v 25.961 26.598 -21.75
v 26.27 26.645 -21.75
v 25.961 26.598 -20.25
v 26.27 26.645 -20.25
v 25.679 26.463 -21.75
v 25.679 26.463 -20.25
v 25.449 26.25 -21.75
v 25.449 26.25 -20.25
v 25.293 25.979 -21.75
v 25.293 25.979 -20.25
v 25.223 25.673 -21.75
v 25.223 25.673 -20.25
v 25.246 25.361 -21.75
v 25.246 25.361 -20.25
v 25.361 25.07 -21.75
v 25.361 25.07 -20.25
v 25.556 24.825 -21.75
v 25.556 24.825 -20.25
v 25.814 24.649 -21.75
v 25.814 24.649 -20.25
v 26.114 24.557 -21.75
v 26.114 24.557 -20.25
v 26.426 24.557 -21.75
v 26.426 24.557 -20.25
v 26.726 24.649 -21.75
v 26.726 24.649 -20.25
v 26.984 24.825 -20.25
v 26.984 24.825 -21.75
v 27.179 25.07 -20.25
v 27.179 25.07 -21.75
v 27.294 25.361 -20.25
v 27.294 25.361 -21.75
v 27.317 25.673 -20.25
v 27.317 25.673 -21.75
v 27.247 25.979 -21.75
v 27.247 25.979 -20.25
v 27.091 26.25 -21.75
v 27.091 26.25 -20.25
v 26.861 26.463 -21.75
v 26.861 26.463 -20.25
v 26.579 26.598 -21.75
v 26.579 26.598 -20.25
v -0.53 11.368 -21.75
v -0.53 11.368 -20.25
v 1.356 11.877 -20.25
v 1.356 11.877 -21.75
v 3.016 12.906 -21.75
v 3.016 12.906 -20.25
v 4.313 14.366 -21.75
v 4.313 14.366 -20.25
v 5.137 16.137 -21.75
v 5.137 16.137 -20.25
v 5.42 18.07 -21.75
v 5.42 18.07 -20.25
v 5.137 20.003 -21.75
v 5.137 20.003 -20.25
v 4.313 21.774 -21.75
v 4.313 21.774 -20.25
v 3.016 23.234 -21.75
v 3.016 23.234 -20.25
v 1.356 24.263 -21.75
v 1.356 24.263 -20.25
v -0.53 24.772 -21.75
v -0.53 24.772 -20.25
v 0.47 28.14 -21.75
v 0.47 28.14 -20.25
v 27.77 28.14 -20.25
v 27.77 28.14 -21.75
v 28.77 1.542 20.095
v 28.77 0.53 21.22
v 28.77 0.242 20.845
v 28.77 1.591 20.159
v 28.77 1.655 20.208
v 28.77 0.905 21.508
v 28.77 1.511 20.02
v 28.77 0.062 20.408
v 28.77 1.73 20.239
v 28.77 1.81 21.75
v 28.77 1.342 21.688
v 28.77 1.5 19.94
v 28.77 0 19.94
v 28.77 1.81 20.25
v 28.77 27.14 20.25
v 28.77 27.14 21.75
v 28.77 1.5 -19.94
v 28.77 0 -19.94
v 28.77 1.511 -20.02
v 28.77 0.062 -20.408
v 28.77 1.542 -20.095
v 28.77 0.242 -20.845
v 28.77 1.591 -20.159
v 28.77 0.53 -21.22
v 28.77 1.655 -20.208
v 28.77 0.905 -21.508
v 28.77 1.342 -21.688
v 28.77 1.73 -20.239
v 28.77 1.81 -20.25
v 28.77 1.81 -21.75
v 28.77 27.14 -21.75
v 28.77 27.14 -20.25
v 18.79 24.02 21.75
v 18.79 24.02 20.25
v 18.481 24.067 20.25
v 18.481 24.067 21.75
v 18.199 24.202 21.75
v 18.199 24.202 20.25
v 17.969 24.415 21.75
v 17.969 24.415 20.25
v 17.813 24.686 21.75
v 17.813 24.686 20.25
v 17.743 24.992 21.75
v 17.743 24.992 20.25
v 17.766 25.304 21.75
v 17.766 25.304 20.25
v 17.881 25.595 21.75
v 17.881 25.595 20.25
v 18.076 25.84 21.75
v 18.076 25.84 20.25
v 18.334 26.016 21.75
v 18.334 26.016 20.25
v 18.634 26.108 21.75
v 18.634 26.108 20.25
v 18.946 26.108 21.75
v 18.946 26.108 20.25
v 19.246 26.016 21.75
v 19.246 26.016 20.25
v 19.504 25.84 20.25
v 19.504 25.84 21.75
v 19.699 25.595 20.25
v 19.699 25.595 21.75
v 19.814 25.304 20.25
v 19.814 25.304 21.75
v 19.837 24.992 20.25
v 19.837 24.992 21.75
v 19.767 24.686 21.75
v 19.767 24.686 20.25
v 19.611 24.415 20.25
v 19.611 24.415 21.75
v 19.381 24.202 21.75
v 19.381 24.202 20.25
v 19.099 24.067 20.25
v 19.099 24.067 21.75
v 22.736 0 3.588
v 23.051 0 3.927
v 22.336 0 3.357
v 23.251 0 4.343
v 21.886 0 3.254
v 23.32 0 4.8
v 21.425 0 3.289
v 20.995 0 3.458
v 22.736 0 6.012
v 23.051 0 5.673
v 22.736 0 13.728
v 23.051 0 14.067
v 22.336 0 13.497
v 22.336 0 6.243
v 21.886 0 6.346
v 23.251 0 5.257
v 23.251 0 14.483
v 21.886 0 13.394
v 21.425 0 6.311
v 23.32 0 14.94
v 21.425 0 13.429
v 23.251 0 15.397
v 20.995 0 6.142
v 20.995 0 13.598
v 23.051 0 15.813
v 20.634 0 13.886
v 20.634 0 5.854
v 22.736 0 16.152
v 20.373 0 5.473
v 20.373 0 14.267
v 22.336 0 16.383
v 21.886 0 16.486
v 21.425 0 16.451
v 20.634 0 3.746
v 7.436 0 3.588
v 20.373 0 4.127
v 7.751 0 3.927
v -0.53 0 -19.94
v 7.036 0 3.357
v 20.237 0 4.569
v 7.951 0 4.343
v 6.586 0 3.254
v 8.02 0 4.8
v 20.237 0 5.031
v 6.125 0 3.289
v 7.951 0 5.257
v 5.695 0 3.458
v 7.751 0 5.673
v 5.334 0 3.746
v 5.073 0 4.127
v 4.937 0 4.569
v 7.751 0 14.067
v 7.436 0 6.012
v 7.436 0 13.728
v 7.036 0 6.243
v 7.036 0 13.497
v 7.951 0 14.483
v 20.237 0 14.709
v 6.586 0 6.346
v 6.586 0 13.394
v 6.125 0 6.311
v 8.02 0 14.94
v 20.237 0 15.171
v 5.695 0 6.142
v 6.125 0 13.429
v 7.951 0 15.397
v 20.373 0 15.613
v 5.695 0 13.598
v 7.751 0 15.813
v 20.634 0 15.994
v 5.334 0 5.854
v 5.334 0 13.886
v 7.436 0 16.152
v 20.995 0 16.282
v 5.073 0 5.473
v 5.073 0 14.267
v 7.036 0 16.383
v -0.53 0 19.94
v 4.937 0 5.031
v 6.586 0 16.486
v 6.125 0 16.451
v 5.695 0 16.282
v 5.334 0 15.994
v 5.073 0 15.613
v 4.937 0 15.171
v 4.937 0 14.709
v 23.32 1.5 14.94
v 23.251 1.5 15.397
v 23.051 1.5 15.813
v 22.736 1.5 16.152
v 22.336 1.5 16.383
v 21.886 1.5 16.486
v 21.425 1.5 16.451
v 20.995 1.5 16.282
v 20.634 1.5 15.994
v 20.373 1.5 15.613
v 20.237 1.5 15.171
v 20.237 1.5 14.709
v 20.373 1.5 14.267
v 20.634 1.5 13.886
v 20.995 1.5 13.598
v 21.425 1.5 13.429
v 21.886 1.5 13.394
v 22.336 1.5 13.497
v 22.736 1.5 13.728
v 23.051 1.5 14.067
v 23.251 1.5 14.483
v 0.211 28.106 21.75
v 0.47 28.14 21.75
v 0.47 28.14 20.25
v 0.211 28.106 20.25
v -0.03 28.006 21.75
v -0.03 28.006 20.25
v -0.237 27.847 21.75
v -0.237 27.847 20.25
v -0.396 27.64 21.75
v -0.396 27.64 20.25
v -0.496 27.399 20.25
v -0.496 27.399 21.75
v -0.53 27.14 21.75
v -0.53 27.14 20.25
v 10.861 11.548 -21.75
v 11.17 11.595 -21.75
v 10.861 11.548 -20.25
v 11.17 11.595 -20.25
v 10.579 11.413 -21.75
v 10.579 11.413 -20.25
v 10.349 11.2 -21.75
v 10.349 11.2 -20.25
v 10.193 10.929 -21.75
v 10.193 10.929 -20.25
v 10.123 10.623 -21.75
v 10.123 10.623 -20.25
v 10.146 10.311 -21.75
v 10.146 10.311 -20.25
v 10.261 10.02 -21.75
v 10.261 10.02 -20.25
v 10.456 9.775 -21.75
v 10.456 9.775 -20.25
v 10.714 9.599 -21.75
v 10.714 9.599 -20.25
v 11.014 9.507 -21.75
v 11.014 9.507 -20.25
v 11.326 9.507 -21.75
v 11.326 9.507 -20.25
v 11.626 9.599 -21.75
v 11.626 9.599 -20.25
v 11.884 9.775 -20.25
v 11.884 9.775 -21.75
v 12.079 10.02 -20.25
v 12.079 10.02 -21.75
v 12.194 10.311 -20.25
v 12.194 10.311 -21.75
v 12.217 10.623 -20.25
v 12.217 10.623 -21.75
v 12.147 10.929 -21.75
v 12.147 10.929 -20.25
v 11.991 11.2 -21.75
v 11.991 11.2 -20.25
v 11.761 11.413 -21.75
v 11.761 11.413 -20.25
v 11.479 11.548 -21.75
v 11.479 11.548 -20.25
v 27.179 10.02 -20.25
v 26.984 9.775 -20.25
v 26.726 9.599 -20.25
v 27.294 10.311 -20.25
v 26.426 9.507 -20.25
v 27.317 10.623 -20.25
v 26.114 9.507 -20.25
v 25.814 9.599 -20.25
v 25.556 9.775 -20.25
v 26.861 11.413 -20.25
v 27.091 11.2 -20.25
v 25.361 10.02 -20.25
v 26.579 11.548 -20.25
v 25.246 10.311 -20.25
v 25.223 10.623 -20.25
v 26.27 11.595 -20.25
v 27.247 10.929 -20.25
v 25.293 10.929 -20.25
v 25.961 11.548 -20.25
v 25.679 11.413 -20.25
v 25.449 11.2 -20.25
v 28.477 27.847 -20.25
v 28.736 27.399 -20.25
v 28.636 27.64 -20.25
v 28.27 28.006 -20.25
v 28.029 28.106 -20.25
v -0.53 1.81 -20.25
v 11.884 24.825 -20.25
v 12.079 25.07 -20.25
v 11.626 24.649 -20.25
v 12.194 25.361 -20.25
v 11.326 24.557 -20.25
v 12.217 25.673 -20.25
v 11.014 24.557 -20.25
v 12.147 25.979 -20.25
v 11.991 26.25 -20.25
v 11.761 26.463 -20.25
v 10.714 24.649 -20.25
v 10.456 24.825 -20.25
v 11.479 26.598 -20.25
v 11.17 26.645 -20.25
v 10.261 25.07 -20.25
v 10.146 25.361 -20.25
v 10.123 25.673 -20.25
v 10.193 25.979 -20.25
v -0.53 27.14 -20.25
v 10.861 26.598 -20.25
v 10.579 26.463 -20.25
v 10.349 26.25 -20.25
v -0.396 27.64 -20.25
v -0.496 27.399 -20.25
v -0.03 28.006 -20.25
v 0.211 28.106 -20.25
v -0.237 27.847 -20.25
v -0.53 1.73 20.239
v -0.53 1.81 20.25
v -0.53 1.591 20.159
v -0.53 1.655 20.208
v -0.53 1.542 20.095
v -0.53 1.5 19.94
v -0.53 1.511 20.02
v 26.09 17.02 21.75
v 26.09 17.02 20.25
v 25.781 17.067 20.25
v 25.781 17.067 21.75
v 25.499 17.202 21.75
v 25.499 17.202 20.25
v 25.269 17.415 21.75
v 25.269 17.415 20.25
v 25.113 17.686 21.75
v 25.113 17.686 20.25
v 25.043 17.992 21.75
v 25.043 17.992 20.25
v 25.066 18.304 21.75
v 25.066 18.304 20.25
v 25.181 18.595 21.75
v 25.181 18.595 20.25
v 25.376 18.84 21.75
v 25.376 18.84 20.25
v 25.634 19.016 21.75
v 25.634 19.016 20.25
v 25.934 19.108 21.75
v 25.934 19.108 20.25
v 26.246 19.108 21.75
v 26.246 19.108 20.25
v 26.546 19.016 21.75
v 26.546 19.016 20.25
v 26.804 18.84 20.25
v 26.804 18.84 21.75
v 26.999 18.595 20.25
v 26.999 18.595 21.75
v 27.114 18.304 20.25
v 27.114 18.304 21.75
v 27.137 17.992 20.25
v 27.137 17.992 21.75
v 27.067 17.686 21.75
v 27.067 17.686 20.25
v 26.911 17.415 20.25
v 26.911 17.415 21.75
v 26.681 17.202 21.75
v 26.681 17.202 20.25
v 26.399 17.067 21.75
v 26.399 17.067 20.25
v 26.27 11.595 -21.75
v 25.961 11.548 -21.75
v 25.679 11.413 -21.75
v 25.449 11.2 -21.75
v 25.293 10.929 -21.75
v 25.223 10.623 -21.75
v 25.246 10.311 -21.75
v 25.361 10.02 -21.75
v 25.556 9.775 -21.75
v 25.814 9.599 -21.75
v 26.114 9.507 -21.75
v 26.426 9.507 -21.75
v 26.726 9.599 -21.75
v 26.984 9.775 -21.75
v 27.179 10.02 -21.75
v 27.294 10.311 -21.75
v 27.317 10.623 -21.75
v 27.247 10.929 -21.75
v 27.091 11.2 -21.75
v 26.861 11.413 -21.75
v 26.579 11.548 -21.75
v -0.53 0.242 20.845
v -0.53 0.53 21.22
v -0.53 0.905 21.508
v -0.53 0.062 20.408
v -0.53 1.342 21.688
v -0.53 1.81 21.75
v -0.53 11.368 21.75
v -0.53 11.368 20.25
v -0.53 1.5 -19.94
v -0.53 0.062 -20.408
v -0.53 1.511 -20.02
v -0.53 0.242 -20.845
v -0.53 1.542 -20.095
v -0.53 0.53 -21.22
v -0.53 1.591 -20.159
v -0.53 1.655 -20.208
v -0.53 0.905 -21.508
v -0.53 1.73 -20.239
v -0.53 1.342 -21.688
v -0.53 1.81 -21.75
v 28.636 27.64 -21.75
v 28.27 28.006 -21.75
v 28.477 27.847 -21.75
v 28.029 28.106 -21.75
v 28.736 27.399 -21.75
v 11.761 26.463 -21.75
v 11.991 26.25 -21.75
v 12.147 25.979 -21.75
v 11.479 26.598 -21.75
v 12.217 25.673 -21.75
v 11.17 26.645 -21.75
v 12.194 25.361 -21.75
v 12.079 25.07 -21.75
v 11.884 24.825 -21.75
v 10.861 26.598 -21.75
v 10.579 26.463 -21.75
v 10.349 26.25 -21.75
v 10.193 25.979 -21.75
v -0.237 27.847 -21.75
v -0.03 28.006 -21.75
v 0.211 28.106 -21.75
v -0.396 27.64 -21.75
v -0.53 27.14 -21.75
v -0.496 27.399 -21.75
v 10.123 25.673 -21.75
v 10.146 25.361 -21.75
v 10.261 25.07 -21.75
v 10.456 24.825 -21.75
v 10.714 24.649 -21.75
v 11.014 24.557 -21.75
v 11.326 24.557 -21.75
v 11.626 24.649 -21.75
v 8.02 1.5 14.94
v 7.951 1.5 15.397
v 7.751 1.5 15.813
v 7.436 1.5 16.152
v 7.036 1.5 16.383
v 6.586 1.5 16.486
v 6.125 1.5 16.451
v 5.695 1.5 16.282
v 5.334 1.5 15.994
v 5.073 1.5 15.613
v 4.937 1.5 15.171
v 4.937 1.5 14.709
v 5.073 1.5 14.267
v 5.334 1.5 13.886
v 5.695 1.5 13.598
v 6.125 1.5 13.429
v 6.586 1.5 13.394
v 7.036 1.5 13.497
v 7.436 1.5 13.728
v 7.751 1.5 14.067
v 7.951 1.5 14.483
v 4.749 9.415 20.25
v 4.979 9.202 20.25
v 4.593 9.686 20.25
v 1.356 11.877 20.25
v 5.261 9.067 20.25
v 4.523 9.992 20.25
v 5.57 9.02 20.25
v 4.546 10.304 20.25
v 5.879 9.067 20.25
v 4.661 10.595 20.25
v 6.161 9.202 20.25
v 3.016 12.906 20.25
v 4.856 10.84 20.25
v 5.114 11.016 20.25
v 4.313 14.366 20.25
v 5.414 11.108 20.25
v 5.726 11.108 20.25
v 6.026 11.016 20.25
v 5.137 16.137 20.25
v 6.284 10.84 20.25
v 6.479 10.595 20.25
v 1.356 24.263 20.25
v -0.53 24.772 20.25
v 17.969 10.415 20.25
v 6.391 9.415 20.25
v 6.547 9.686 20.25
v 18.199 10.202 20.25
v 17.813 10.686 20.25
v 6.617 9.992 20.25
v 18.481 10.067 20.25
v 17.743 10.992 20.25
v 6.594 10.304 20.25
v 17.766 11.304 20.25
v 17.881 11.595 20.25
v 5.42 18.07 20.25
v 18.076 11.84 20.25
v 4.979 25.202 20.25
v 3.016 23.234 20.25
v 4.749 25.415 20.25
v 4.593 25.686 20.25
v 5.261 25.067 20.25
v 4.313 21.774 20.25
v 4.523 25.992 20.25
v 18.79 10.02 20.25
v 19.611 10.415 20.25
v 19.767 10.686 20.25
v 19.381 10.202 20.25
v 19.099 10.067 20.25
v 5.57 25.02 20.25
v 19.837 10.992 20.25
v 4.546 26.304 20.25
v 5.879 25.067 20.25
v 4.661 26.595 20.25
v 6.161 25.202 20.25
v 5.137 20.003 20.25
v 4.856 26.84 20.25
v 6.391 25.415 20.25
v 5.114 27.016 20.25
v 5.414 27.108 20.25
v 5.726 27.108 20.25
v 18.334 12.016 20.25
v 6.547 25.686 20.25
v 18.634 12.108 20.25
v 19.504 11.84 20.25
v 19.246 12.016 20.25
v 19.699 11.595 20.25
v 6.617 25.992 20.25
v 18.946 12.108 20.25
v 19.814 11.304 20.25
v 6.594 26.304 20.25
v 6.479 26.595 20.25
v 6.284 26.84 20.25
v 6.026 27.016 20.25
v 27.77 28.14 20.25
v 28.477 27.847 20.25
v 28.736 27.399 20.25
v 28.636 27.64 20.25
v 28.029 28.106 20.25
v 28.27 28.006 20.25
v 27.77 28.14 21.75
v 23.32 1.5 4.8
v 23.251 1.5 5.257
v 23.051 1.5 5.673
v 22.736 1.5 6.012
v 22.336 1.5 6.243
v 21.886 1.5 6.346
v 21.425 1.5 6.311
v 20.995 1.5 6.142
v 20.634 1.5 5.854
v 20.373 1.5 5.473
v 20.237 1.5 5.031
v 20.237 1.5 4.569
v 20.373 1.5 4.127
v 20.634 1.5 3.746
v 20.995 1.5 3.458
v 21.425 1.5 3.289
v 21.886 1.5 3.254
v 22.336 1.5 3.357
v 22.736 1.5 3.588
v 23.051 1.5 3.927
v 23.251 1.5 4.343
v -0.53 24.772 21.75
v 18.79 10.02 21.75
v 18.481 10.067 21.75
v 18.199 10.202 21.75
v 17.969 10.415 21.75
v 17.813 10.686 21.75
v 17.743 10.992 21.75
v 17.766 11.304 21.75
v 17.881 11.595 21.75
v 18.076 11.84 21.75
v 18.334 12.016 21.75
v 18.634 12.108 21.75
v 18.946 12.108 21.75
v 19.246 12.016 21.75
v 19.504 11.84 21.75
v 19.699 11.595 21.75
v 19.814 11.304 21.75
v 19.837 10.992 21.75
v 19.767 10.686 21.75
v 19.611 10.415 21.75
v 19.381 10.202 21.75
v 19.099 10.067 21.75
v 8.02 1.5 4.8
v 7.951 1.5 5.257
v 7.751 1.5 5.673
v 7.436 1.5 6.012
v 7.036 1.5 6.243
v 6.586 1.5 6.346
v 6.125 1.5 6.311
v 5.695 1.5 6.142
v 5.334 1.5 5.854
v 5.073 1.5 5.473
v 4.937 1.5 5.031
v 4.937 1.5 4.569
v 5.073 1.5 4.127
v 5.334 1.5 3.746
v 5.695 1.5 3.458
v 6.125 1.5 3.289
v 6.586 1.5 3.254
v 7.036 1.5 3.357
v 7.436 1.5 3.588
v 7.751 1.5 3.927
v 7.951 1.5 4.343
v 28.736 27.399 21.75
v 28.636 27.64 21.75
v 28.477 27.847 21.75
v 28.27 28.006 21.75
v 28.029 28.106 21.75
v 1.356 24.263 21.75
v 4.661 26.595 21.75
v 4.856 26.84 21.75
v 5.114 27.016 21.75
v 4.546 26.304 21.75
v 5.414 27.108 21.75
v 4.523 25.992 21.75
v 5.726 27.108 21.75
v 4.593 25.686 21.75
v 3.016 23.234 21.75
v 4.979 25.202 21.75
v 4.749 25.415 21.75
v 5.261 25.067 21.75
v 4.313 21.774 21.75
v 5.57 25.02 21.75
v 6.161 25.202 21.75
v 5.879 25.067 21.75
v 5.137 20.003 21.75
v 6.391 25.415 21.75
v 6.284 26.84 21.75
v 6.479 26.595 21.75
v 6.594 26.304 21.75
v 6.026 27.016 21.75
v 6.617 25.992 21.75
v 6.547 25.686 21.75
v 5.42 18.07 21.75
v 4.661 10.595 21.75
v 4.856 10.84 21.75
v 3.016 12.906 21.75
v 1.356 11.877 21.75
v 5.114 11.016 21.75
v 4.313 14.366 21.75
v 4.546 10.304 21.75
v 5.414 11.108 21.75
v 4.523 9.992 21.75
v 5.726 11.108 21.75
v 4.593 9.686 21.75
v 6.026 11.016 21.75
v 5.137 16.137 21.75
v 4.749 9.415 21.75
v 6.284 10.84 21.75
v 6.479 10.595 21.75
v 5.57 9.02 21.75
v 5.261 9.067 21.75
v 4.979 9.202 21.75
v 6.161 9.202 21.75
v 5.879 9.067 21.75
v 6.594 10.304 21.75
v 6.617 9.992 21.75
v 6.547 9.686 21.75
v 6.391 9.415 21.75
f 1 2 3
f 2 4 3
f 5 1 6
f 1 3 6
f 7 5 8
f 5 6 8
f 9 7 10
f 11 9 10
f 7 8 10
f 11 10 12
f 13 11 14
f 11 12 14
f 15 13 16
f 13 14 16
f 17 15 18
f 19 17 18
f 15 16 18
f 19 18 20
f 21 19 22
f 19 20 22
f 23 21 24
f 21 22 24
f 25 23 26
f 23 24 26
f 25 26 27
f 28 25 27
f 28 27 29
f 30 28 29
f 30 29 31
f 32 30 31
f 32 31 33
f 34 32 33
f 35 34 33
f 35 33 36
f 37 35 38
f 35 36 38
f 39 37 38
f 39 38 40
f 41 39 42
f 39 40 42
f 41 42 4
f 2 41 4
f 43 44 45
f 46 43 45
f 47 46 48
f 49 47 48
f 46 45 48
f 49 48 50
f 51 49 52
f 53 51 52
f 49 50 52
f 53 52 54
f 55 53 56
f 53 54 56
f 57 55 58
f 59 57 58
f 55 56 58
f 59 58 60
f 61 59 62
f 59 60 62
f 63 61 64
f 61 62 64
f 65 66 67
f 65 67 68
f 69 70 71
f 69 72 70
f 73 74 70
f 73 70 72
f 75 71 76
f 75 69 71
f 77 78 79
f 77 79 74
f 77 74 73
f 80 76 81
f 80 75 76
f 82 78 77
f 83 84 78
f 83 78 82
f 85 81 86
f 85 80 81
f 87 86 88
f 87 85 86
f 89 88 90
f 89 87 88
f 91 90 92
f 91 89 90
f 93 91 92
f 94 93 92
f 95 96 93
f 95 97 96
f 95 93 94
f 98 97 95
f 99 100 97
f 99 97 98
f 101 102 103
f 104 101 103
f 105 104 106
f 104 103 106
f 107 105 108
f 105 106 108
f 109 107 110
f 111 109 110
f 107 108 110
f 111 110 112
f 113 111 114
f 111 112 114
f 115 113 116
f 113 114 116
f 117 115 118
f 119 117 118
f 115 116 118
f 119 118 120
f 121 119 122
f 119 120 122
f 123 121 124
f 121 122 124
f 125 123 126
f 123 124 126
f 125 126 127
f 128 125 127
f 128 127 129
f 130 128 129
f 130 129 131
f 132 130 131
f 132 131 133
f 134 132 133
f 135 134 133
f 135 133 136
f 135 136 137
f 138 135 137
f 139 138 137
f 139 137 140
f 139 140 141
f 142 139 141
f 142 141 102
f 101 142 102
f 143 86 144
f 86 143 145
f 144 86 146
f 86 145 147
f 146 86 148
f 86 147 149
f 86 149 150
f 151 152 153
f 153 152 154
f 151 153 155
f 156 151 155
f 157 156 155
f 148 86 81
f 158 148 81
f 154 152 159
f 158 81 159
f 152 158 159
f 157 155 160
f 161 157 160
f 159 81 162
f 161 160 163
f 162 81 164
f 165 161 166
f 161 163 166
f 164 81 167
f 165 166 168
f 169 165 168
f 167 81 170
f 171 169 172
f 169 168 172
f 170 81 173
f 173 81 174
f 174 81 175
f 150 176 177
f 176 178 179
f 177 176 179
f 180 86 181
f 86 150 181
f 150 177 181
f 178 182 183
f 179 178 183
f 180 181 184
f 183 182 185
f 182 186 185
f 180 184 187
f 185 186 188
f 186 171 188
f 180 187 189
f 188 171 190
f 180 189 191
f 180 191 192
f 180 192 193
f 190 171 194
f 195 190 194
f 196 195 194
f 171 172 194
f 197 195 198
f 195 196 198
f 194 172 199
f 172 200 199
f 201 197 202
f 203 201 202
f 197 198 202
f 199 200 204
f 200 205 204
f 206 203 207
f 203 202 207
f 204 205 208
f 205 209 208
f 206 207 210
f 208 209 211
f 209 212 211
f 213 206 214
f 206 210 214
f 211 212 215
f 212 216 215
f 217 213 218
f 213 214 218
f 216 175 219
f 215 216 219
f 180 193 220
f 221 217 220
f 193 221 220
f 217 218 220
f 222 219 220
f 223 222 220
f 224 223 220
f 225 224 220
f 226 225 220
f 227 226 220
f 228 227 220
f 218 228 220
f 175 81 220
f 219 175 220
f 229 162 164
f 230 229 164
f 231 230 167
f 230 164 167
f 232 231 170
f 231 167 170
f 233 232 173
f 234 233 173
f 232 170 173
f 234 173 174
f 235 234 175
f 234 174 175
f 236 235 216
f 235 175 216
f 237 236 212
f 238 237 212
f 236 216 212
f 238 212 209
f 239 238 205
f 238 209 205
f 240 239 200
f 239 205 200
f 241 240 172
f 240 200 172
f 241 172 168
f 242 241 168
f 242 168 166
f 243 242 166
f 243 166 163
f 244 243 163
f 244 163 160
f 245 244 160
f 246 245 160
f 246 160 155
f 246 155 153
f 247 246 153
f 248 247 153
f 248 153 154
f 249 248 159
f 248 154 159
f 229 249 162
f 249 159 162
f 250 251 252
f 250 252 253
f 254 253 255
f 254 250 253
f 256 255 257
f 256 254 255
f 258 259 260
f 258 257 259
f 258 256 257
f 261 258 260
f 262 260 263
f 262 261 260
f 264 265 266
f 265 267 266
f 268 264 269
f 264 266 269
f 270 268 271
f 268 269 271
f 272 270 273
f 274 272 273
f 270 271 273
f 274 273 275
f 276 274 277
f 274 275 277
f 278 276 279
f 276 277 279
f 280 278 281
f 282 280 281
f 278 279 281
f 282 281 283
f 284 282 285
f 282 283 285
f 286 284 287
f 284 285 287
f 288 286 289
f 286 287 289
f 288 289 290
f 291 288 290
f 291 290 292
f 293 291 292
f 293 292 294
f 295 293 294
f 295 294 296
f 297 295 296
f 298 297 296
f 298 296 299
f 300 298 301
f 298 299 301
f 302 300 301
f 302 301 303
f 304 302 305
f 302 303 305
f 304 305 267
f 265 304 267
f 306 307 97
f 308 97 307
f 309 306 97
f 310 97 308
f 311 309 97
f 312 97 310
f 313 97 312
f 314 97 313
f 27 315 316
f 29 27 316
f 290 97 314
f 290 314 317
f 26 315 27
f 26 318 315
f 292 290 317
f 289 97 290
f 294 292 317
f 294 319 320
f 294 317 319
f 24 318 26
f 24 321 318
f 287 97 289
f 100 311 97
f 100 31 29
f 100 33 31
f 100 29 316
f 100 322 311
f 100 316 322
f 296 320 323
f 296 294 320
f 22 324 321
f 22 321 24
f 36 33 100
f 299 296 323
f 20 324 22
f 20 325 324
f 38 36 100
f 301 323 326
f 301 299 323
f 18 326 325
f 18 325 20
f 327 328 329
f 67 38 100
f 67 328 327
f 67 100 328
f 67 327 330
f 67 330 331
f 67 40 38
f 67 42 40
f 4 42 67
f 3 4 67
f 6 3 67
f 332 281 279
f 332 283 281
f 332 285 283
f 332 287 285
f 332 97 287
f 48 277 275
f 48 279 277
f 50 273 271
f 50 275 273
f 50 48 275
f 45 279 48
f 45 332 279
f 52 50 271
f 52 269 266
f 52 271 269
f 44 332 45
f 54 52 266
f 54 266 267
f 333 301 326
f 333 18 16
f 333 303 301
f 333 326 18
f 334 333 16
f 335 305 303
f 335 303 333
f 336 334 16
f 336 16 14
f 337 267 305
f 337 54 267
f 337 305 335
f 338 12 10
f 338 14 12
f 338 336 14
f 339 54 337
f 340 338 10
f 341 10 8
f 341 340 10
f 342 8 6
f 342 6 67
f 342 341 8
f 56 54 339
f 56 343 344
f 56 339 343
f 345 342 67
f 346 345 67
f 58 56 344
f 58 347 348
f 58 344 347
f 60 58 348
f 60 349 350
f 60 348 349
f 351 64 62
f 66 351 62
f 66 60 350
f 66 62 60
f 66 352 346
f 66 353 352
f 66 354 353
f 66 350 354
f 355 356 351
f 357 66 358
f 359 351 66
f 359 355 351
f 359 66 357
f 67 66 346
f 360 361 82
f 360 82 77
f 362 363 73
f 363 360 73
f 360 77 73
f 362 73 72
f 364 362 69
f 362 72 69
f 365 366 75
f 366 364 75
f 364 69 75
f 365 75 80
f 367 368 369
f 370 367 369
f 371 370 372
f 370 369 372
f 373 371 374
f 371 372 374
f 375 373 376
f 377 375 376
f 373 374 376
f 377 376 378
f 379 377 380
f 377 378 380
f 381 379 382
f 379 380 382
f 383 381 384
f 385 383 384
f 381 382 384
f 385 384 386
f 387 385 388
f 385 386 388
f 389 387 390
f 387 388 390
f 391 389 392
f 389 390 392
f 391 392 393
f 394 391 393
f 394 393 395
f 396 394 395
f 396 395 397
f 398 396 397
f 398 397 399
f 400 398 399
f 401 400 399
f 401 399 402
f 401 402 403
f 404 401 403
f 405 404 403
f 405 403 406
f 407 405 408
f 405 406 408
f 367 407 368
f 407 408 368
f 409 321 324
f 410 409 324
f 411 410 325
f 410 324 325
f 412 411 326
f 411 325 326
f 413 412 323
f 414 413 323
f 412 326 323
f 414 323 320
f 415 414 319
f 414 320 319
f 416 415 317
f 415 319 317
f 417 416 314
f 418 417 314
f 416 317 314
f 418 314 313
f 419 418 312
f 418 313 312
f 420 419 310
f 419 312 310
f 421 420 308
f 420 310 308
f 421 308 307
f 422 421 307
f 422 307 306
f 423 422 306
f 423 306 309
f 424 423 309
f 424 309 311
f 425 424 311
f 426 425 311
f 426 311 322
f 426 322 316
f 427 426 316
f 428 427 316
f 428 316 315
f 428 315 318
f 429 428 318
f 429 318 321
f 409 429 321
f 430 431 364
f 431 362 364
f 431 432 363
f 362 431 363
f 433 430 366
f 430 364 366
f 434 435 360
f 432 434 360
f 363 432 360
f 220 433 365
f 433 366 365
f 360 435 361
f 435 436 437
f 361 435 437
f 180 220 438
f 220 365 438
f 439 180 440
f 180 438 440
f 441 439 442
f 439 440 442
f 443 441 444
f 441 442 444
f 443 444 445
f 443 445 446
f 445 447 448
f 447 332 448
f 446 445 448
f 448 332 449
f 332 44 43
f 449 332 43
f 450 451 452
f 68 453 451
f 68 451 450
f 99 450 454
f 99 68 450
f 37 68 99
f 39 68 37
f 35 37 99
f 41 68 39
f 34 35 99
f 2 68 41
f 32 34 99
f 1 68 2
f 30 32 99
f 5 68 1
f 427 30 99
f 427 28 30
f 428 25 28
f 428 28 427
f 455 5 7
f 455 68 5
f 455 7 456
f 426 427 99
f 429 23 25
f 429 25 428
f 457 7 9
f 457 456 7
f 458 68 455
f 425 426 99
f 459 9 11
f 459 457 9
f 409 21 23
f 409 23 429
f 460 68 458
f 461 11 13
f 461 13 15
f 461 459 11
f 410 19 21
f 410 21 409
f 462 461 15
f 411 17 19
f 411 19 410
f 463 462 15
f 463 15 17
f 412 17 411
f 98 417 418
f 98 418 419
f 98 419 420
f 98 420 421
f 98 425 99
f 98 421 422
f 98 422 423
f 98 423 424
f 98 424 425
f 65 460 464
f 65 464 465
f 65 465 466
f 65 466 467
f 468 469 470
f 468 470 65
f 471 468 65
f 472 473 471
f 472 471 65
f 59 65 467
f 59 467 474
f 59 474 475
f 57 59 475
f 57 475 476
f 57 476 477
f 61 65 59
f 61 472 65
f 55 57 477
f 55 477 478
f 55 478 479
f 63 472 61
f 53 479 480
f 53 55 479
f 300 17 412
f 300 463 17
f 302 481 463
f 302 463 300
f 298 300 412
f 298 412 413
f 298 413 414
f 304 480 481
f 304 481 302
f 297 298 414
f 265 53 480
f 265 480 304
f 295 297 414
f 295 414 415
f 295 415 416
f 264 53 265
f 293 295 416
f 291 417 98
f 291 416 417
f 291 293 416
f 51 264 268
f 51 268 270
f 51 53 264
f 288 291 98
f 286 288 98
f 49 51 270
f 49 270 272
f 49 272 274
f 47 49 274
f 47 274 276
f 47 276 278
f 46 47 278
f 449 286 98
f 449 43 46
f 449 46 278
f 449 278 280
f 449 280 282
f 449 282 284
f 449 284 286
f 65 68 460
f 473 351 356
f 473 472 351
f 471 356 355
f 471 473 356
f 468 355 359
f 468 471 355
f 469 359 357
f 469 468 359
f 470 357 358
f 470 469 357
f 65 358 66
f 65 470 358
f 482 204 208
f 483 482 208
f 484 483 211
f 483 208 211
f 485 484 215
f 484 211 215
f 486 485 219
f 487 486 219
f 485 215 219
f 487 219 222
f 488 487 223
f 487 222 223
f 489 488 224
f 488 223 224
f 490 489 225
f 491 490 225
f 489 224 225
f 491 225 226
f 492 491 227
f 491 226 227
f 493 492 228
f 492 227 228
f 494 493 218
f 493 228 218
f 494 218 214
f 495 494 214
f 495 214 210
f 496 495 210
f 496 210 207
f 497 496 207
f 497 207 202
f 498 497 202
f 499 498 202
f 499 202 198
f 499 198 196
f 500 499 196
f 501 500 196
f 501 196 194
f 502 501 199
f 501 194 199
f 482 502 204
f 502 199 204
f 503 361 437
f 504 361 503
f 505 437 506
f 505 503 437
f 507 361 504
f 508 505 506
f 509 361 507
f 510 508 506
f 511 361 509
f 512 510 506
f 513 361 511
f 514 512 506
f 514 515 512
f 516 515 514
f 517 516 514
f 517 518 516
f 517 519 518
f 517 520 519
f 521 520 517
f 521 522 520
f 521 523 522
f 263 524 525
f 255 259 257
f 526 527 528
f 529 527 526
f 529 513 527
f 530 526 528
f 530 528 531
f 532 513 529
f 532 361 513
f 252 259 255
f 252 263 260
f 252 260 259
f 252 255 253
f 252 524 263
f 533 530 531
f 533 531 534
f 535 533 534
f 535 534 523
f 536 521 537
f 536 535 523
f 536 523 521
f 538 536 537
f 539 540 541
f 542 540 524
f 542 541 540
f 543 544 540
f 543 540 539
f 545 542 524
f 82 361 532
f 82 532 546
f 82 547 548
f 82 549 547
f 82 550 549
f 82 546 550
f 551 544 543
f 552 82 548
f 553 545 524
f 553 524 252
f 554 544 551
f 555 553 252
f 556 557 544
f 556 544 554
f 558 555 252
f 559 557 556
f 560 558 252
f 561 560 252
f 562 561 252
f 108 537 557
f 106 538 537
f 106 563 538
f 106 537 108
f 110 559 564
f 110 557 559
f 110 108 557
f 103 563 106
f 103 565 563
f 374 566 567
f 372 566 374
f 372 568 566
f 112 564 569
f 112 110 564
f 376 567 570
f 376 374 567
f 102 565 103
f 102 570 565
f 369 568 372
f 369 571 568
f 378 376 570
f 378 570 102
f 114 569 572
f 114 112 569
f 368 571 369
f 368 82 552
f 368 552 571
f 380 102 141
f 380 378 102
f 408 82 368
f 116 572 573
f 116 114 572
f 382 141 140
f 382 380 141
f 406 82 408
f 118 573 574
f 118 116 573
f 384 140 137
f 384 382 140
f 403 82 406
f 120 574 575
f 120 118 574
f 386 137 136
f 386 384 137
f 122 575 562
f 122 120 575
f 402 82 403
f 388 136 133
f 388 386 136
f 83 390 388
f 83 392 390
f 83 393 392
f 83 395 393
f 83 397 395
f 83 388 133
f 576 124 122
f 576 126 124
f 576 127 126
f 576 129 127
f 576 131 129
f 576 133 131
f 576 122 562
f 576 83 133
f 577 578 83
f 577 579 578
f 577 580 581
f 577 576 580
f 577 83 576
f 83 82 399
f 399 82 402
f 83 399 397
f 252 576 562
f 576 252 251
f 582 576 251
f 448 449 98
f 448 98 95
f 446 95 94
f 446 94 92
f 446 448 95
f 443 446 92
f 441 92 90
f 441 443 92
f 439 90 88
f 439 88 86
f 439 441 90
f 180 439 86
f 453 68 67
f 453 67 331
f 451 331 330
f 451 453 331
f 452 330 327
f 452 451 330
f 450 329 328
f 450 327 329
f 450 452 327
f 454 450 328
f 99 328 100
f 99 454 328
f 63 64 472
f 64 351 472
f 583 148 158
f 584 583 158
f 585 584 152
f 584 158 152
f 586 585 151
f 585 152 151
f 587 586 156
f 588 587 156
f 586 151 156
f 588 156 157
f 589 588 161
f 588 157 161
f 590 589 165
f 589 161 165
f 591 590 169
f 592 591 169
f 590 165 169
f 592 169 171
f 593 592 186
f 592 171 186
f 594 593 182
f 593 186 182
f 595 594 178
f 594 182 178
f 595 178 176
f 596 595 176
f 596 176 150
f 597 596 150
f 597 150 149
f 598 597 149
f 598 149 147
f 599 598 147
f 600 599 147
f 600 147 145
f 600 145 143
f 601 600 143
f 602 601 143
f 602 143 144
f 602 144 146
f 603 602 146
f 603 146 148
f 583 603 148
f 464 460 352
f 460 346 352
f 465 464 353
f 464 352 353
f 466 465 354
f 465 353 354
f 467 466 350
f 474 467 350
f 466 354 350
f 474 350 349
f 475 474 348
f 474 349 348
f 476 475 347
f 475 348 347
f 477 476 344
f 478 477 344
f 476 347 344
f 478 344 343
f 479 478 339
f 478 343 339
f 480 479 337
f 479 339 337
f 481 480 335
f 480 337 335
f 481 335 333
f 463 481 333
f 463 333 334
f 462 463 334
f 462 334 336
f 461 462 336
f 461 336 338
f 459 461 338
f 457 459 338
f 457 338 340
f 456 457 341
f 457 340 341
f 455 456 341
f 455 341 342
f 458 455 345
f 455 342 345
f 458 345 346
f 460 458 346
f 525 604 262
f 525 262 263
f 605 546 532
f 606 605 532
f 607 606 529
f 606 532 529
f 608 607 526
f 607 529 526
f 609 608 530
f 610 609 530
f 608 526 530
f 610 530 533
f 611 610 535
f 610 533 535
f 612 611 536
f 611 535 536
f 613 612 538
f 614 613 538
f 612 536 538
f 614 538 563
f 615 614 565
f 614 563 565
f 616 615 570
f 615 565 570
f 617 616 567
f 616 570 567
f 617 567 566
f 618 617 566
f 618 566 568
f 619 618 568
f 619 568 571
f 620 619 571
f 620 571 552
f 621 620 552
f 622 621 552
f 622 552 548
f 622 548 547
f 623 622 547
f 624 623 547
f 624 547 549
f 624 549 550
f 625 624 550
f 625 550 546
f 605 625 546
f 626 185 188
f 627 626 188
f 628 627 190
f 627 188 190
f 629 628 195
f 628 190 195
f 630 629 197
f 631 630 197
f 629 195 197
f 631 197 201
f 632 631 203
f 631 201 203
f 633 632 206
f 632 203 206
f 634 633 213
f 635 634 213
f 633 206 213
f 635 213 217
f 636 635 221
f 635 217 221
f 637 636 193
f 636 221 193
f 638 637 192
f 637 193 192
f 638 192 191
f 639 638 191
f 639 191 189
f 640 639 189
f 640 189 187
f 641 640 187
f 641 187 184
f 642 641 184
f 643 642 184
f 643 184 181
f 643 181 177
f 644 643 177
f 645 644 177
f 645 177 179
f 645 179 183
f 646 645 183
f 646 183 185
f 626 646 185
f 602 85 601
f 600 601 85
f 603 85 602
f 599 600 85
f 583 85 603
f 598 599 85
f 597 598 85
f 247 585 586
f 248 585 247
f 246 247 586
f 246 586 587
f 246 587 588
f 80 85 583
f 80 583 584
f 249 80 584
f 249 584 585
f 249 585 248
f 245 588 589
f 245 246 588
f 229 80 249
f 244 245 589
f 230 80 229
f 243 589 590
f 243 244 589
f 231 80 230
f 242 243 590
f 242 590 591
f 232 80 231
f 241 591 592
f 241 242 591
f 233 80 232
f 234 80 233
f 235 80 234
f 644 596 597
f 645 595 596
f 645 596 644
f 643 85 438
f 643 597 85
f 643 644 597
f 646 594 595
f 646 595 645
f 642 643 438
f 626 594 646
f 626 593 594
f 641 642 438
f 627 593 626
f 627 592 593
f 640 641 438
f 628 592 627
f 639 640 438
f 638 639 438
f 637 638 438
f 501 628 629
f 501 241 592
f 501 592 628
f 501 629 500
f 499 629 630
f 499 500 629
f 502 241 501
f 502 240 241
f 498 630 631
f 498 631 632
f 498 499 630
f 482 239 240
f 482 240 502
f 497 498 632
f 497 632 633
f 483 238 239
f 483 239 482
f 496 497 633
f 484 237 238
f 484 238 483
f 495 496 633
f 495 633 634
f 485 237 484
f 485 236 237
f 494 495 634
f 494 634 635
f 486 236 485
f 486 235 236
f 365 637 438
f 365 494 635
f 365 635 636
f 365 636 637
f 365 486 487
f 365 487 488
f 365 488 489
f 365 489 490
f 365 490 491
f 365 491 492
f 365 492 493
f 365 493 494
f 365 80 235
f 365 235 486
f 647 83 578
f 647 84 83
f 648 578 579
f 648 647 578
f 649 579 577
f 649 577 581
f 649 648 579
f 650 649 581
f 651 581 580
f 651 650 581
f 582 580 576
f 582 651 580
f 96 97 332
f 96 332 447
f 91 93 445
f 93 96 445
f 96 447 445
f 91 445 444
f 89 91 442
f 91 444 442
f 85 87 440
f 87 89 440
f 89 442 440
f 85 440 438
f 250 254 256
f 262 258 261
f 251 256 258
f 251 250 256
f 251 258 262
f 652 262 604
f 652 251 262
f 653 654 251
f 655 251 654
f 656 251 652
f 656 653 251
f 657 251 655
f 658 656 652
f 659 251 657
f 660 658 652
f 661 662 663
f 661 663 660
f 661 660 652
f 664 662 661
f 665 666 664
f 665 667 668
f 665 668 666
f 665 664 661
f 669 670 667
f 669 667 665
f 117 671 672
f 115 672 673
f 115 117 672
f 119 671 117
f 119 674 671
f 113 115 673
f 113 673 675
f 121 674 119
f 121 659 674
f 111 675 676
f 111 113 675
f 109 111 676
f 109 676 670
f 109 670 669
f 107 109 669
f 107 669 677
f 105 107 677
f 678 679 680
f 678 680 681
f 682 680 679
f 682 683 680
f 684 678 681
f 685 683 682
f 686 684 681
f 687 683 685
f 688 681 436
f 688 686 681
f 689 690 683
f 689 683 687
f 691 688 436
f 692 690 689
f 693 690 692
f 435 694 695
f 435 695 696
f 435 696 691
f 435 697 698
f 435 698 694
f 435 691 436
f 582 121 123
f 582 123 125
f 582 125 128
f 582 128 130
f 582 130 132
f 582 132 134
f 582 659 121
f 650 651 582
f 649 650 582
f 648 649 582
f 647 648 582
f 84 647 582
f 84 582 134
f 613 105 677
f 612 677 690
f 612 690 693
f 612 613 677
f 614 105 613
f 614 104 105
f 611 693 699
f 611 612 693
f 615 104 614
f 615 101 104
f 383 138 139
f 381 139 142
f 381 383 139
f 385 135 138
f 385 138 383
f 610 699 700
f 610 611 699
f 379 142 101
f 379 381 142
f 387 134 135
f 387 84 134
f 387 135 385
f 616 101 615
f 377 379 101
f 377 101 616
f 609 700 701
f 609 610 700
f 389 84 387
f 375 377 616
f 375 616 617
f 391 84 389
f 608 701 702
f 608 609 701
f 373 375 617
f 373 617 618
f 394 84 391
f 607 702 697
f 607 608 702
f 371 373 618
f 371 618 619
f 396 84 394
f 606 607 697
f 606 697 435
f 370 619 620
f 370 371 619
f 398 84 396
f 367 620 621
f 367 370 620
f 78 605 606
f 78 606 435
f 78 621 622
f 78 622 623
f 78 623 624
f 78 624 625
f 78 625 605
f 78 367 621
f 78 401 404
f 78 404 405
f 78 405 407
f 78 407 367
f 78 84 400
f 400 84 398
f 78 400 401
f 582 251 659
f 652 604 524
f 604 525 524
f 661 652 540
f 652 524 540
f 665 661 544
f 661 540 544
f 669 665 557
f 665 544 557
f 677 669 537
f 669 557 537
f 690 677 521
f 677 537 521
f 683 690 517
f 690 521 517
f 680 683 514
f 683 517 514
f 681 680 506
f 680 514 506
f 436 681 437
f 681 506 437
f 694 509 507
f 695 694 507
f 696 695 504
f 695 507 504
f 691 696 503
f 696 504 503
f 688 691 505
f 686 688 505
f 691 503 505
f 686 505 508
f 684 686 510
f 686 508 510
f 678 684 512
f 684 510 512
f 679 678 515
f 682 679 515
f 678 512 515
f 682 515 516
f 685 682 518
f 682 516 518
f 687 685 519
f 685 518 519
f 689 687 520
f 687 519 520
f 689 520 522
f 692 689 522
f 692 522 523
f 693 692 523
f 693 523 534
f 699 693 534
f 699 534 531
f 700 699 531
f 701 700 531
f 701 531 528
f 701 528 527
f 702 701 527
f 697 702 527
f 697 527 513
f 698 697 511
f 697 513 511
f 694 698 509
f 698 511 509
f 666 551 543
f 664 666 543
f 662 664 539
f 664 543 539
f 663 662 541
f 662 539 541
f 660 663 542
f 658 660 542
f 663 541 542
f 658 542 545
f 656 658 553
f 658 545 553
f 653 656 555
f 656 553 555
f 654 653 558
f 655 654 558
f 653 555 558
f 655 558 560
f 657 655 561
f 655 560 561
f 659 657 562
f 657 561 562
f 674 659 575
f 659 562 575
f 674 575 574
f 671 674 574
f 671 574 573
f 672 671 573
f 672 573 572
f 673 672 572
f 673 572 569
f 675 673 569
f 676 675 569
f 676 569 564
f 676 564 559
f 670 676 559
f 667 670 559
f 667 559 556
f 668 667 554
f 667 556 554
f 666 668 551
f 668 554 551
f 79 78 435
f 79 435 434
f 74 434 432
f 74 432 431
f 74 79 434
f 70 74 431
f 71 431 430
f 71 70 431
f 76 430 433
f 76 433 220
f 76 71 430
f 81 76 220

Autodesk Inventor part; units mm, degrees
ref_plane "YZ Plane" through (0, 0, 0) normal (1, 0, 0) x (0, 1, 0)
ref_plane "XZ Plane" through (0, 0, 0) normal (0, 1, 0) x (-1, 0, 0)
ref_plane "XY Plane" through (0, 0, 0) normal (0, 0, 1) x (1, 0, 0)
sketch "Sketch1" plane through (0, 0, 0) normal (0, 1, 0) x (-1, 0, 0)
  line L0 (0.53, 20.25) -> (-28.77, 20.25)
  line L1 (-28.77, 20.25) -> (-28.77, -20.25)
  line L2 (-28.77, -20.25) -> (0.53, -20.25)
  line L3 (0.53, -20.25) -> (0.53, 20.25)
  point P0 (0, 0)
  dimension "d0" = 40.5
  dimension "d1" = 29.3
  dimension "d2" = -0.53
  dimension "d3" = 20.25
extrude "Plate1" add sketch "Sketch1" along normal blind 1.5
sketch "Sketch2" plane through (28.77, 0, 21.75) normal (0, 0, -1) x (-1, 0, 0)
  line L0 (29.3, 0) -> (0, 0)
  line L1 (0, 0) -> (0, 28.14)
  line L2 (0, 28.14) -> (29.3, 28.14)
  line L3 (29.3, 28.14) -> (29.3, 0)
edge flange "Flange1" height 28.14 angle 90 thickness 1.5 bend radius 0.31 thickness toward (0, 0, -1) relief tear relief width 1.5 relief depth 0.75 corner gap 0.31 corner form 0 edges at (14.12, 1.5, 20.25) (14.12, 1.5, -20.25) wall of the first edge with corners at (-0.53, 0, 21.75) (28.77, 0, 21.75) (28.77, 28.14, 21.75) (-0.53, 28.14, 21.75)
bend "Bend1"
corner "Corner1"
sketch "Sketch6" plane through (-0.53, 28.14, 21.75) normal (0, 0, 1) x (1, 0, 0)
  point P0 (0.53, -28.14)
sketch "Sketch8" plane through (28.77, 28.14, -21.75) normal (0, 0, -1) x (-1, 0, 0)
  circle A0 centre (2.5, -2.545) radius 0.7835
  circle A1 centre (2.5, -17.595) radius 0.7835
  circle A2 centre (17.6, -2.545) radius 0.7835
  circle A3 centre (17.6, -17.595) radius 0.7835
  circle A4 centre (37.6, -2.545) radius 0.7835
  circle A5 centre (37.6, -17.595) radius 0.7835
  point P0 (28.77, -28.14)
hole "Hole4" at (26.27, 25.595, -21.75) at (26.27, 10.545, -21.75) at (11.17, 25.595, -21.75) at (11.17, 10.545, -21.75) at (-8.83, 25.595, -21.75) at (-8.83, 10.545, -21.75) direction (0, 0, 1) diameter 2.1 depth 1.5
sketch "Sketch9" plane through (28.77, 28.14, -21.75) normal (0, 0, -1) x (-1, 0, 0)
  circle A0 centre (30.1, -10.07) radius 6
  point P0 (28.77, -28.14)
sketch "Sketch10" plane through (-0.53, 28.14, 21.75) normal (0, 0, 1) x (1, 0, 0)
  point P0 (0.53, -28.14)
sketch "Sketch11" plane through (-0.53, 28.14, 21.75) normal (0, 0, 1) x (1, 0, 0)
  point P0 (0.53, -28.14)
sketch "Sketch15" plane through (0, 0, 0) normal (0, -1, 0) x (1, 0, 0)
  point P0 (0, 0)
sketch "Sketch16" plane through (0, 0, 0) normal (0, -1, 0) x (1, 0, 0)
  circle A0 centre (6.47, 14.94) radius 1.55
  line L0 (28.77, 19.94) -> (-0.53, 19.94) projected
  line L1 (-0.53, -19.94) -> (-0.53, 19.94) projected
  circle A1 centre (21.77, 14.94) radius 1.55
  line L2 (28.77, 19.94) -> (28.77, -19.94) projected
  circle A2 centre (6.47, 4.8) radius 1.55
  circle A3 centre (21.77, 4.8) radius 1.55
  point P0 (0, 0)
  dimension "d65" = 3.1
  dimension "d66" = 5
  dimension "d67" = 7
  dimension "d68" = 3.1
  dimension "d69" = 5
  dimension "d70" = 7
  dimension "d71" = 3.1
  dimension "d72" = 15.14
  dimension "d73" = 7
  dimension "d74" = 3.1
  dimension "d75" = 15.14
  dimension "d76" = 7
extrude "Cut6" cut sketch "Sketch16" against normal blind 1.5
sketch "Sketch18" plane through (-0.53, 28.14, 21.75) normal (0, 0, 1) x (1, 0, 0)
  circle A0 centre (-0.8, -10.07) radius 6
  point P0 (0.53, -28.14)
fillet "Corner Round1" radius 1 4 edges at (-0.53, 28.14, -21) (28.77, 28.14, -21) (28.77, 28.14, 21) (-0.53, 28.14, 21)
sketch "Sketch19" plane through (-0.53, 1.81, 21.75) normal (0, 0, 1) x (1, 0, 0)
  circle A0 centre (6.1, 24.26) radius 0.7835
  circle A1 centre (19.32, 23.26) radius 0.7835
  circle A2 centre (26.62, 16.26) radius 0.7835
  circle A3 centre (19.32, 9.26) radius 0.7835
  circle A4 centre (6.1, 8.26) radius 0.7835
  point P0 (0.53, -1.81)
hole "Hole6" at (5.57, 26.07, 21.75) at (18.79, 25.07, 21.75) at (26.09, 18.07, 21.75) at (18.79, 11.07, 21.75) at (5.57, 10.07, 21.75) direction (0, 0, -1) diameter 2.1 depth 1.5
hole "Hole7" at (-1.33, 18.07, 21.75) direction (0, 0, -1) diameter 13.5 depth 1.5
hole "Hole8" at (-1.33, 18.07, -21.75) direction (0, 0, 1) diameter 13.5 depth 1.5
equation "\"d55\" = Thickness"
equation "\"d77\" = Thickness"
equation "\"d94\" = Thickness"
equation "\"d101\" = Thickness"
equation "\"d108\" = Thickness"
equation "\"d4\" = Thickness"
equation "\"d5\" = BendReliefWidth"
equation "\"d6\" = BendReliefDepth"
equation "\"d7\" = MinimumRemnant"
equation "\"d8\" = TransitionRadius"
equation "\"d11\" = BendRadius"
equation "\"d12\" = CornerReliefSize"
equation "\"d13\" = GapSize"
equation "\"d14\" = JacobiRadiusSize"
equation "\"BendReliefWidth\" = Thickness"
equation "\"BendReliefDepth\" = 0.5 * Thickness"
equation "\"CornerReliefSize\" = 4 * Thickness"
equation "\"MinimumRemnant\" = 2 * Thickness"
equation "\"TransitionRadius\" = BendRadius"
equation "\"JacobiRadiusSize\" = BendRadius"
equation "\"GapSize\" = Thickness"
equation "\"Thickness\" = 1.5"
equation "\"BendRadius\" = 0.31"
properties part number "axis_25_bottom_frame" material "Aluminum 6061-AHC"
